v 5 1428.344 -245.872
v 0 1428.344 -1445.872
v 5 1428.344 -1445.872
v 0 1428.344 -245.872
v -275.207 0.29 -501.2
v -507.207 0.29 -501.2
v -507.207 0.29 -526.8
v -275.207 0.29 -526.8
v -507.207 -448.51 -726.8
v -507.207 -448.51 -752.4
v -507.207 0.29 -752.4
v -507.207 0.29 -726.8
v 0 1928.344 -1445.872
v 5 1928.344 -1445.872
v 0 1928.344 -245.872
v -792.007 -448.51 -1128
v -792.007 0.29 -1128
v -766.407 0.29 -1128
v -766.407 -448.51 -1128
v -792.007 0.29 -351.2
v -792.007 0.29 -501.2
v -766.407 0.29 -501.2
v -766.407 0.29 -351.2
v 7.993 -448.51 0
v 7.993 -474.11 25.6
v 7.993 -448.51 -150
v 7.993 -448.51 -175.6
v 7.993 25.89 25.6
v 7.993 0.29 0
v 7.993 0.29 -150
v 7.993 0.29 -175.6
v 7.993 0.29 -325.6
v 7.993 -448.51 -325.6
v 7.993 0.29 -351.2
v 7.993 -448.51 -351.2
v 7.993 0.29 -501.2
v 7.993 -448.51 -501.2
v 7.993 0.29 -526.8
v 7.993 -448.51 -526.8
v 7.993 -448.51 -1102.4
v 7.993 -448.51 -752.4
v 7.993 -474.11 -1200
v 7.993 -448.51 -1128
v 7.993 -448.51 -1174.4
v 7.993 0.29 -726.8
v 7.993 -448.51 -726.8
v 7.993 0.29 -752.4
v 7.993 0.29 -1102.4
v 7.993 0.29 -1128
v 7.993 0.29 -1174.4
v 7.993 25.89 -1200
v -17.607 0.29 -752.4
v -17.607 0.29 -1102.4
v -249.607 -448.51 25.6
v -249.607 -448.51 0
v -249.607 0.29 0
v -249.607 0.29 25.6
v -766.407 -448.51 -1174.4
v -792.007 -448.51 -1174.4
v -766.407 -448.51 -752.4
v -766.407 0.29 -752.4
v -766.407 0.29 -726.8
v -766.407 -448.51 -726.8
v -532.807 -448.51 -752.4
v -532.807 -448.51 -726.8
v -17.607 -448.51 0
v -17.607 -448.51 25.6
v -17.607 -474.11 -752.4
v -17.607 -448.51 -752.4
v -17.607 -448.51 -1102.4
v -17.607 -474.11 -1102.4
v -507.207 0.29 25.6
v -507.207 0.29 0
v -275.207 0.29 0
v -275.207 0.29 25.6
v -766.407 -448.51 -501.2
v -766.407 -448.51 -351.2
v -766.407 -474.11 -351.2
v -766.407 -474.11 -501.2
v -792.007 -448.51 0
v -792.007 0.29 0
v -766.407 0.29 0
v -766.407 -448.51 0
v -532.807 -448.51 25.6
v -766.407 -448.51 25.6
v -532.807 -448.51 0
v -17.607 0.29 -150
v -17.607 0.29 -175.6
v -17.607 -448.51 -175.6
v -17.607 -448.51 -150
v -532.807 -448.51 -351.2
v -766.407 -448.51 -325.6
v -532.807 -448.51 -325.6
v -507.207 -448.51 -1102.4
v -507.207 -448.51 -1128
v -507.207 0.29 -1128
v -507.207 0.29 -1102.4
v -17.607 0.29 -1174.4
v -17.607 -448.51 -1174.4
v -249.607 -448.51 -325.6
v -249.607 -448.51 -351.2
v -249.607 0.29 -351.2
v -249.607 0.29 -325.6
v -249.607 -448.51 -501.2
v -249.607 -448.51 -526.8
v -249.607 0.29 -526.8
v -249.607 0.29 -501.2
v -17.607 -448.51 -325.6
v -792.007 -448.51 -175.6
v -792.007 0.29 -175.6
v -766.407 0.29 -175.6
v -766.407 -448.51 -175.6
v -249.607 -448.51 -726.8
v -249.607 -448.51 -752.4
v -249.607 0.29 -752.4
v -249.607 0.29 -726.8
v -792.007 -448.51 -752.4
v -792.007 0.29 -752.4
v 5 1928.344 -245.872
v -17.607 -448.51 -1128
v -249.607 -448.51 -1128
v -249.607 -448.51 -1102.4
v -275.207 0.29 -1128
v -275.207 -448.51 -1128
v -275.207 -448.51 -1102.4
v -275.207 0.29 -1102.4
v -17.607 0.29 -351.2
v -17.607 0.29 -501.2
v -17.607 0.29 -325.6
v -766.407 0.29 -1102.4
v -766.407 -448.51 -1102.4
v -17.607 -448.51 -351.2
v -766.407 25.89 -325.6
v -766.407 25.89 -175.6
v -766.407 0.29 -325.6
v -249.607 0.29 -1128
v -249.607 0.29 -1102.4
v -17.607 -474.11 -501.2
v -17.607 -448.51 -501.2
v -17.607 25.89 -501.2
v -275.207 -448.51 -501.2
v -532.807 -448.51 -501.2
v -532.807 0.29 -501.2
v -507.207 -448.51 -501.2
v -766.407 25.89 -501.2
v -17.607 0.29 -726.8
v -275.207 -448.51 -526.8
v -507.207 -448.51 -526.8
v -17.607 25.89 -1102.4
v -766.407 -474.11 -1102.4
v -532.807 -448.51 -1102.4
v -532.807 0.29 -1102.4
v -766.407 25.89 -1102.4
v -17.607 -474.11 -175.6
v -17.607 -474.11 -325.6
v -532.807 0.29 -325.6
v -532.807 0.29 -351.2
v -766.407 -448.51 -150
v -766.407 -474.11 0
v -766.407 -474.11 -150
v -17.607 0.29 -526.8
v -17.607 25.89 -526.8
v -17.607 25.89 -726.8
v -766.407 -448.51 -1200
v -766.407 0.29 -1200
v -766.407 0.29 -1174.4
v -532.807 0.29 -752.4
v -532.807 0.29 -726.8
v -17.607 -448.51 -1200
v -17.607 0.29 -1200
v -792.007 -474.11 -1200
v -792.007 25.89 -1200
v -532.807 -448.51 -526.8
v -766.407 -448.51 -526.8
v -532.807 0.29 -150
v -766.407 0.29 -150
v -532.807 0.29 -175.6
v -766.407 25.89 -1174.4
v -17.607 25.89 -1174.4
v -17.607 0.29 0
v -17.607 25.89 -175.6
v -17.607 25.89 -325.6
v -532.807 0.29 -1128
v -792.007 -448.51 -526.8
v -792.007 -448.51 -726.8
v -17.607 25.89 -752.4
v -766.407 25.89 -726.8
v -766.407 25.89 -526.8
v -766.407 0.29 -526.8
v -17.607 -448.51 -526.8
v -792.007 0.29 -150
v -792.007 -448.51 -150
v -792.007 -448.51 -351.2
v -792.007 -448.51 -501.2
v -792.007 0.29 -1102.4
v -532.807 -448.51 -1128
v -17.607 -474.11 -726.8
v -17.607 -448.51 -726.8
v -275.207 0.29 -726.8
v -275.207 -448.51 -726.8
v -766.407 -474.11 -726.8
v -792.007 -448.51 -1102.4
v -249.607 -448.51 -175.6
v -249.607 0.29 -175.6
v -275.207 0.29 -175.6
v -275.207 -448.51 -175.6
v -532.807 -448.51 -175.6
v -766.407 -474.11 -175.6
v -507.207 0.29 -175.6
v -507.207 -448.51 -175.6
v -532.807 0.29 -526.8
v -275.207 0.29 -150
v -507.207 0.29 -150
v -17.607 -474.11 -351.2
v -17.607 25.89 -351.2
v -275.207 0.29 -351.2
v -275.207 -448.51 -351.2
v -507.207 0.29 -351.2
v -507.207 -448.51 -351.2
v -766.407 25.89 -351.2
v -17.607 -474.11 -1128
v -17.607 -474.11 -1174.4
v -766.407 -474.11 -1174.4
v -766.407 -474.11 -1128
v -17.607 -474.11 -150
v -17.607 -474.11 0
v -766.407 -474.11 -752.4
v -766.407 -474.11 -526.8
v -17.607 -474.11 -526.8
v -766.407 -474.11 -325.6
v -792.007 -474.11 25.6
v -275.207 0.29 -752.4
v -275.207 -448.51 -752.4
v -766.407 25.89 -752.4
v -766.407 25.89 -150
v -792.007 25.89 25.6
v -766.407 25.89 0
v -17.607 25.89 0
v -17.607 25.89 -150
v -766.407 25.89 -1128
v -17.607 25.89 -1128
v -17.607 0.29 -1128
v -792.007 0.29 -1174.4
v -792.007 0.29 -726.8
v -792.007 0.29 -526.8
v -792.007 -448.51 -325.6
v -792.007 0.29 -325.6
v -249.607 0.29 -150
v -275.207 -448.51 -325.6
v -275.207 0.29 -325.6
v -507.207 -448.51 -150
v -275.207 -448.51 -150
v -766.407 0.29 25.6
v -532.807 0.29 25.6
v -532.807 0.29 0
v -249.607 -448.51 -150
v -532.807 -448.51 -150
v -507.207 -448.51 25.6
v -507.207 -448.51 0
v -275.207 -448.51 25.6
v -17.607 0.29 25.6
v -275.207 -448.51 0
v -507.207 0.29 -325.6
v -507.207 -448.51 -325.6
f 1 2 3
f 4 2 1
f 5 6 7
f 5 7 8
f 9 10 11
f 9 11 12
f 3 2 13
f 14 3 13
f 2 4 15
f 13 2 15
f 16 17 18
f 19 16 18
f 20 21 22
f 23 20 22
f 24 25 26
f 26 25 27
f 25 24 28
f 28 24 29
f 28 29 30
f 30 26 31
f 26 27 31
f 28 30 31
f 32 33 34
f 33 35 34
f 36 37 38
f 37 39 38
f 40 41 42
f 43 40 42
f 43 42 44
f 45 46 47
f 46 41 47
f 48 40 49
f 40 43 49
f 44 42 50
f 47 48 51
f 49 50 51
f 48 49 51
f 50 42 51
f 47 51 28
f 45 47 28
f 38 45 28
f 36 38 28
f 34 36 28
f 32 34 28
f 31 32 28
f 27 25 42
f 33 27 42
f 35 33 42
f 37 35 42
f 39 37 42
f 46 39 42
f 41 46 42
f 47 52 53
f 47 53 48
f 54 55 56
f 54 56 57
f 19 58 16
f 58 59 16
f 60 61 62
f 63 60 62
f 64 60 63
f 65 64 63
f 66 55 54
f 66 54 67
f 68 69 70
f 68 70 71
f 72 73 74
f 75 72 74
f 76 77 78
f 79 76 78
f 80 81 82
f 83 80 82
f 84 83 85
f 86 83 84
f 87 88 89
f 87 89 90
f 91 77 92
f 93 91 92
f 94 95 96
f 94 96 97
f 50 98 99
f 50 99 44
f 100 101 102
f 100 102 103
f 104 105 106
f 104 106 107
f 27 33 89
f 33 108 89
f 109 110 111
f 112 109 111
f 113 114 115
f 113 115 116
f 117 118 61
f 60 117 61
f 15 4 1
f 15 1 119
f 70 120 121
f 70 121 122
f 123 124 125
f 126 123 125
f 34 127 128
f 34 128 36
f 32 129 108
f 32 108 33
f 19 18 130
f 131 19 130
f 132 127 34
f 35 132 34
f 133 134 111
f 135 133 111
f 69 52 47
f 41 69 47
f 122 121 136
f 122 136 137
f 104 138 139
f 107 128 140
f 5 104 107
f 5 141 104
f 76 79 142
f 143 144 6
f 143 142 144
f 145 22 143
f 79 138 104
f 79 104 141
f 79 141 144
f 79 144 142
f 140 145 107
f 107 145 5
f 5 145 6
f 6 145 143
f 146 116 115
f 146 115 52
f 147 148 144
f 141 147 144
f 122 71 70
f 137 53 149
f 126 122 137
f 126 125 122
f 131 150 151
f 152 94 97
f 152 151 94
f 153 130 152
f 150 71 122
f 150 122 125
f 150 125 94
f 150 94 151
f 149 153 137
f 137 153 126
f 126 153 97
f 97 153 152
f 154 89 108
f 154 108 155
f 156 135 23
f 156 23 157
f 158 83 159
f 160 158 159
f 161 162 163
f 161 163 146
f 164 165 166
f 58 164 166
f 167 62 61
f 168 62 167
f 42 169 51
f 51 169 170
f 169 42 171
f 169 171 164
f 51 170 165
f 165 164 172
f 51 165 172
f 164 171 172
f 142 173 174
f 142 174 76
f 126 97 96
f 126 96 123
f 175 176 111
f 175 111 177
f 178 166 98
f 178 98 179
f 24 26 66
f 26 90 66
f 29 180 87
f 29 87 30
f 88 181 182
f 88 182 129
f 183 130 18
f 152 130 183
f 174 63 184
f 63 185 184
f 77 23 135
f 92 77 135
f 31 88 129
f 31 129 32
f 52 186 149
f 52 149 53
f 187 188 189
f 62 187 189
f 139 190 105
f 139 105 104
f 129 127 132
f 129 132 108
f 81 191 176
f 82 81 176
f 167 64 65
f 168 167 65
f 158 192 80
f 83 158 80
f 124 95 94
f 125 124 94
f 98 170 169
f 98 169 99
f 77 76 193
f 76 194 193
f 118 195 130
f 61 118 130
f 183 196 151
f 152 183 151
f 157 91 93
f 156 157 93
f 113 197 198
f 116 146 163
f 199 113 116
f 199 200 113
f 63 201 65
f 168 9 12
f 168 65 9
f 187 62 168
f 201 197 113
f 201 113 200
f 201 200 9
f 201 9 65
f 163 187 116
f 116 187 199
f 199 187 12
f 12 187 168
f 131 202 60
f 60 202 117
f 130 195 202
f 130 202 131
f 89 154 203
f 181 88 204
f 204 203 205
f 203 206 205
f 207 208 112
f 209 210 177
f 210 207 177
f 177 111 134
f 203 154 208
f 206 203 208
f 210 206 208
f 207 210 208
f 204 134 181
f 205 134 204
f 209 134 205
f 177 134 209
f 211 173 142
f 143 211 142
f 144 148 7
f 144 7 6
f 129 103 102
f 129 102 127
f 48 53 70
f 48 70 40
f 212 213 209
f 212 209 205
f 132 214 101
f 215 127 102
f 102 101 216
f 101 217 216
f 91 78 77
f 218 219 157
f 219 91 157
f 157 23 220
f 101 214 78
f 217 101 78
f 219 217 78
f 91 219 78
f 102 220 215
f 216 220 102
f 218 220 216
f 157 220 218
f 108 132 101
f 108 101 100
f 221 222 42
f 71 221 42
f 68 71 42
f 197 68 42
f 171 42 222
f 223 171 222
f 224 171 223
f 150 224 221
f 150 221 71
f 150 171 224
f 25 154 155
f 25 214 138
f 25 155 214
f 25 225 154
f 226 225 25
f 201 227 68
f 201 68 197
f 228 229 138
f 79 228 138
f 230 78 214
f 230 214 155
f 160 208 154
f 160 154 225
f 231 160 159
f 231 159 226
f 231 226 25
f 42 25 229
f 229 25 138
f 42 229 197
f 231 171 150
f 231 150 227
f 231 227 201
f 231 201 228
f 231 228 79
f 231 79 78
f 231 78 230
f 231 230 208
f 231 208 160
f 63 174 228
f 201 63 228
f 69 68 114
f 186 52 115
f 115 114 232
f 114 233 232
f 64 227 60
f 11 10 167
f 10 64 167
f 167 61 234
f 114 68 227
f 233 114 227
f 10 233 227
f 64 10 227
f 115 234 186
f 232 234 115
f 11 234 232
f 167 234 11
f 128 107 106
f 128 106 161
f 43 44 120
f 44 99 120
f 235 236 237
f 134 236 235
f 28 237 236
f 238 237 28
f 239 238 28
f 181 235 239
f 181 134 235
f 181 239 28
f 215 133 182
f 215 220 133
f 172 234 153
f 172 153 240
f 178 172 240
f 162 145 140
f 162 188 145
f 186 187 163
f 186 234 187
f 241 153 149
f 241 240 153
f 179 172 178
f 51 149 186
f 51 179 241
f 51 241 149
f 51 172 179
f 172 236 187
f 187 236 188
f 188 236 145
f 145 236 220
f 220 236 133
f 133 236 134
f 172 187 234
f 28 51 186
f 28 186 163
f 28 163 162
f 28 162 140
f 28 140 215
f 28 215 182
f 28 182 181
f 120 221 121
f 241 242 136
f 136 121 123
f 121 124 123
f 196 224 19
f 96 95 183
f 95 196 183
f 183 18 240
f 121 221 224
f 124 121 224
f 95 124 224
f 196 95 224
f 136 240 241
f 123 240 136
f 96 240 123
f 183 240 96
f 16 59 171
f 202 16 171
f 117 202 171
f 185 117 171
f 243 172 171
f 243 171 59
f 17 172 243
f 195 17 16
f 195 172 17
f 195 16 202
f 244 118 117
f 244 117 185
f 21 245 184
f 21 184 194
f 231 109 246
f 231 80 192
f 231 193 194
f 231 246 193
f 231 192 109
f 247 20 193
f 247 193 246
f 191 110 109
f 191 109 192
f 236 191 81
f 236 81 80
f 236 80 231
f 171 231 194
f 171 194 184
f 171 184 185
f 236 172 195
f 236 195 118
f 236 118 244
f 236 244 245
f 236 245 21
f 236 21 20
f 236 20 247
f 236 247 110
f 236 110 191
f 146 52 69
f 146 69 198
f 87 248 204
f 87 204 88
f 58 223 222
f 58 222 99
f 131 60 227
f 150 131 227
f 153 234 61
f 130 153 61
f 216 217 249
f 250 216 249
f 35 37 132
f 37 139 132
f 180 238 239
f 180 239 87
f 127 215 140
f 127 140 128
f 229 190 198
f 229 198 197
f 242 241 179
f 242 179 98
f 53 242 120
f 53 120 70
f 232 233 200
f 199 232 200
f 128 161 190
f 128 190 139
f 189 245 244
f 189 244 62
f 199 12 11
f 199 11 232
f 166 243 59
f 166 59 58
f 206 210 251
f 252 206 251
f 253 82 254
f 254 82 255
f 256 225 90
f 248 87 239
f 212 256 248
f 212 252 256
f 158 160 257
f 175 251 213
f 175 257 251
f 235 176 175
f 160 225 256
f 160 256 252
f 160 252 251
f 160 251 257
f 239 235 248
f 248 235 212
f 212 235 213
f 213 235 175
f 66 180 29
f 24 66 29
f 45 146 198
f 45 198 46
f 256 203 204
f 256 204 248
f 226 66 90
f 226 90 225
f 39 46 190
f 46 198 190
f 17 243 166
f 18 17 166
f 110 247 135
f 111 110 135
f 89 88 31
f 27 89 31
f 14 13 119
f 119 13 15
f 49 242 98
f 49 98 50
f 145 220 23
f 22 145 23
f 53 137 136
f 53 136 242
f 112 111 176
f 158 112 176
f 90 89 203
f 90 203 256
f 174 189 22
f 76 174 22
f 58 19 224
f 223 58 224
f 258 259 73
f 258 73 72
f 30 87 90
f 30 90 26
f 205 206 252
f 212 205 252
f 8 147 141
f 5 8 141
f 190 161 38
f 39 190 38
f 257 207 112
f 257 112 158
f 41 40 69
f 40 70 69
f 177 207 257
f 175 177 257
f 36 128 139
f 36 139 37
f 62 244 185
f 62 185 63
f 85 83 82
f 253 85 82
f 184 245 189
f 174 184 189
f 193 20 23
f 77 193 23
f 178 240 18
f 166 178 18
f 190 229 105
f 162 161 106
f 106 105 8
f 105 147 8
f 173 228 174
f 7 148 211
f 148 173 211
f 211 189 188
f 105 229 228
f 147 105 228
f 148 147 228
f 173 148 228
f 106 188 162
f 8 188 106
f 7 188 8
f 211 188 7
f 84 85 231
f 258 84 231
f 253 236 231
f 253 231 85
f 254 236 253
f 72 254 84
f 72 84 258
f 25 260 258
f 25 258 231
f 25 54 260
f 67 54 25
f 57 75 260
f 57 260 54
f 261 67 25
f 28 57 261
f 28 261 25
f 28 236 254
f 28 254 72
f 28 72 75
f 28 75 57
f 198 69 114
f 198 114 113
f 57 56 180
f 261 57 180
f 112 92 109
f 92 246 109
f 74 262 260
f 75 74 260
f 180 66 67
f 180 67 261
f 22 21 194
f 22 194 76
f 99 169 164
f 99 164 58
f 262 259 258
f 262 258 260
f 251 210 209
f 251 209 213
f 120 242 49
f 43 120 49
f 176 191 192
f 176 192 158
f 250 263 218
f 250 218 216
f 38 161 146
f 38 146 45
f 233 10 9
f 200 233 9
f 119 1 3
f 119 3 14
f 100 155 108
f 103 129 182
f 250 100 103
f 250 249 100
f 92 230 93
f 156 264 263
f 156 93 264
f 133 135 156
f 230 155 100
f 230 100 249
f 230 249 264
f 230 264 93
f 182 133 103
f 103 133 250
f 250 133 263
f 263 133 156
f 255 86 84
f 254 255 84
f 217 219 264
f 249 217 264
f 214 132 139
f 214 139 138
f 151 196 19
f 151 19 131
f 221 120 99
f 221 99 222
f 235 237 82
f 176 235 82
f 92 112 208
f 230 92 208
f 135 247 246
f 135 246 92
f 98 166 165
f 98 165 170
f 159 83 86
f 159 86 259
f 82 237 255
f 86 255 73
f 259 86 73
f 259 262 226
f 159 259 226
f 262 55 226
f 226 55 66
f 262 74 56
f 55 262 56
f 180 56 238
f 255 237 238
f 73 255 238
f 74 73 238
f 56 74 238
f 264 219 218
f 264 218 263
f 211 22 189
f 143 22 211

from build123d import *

# Parameters (mm, degrees)
F0_W      = 800
F0_H      = 500
F0_W_2    = 748.8
F0_H_2    = 448.8
F1_DEPTH  = 25.6
F2_W      = 25.6
F2_H      = 25.6
F3_DEPTH  = 1200
F4_W      = 25.6
F4_H      = 25.6
F5_DEPTH  = 748.8
F6_W      = 25.6
F6_H      = 25.6
F7_DEPTH  = 448.8
F8_W      = 25.6
F8_H      = 25.6
F9_DEPTH  = 448.8
F10_W     = 500
F10_H     = 1200
F11_DEPTH = 5


with BuildPart() as f1:
    # F0 (on Top) → F1 (new body)
    with BuildSketch(Plane.XY):
        with Locations((-392.007131, -224.110312)):
            Rectangle(F0_W, F0_H)
        with Locations((-392.007131, -224.110312)):
            Rectangle(F0_W_2, F0_H_2, mode=Mode.SUBTRACT)
    extrude(amount=F1_DEPTH)

    # F2 (on face) → F3 (join)
    with BuildSketch(Plane(origin=(0, 0, 0), x_dir=(1, 0, 0), z_dir=(0, 0, -1))):
        with Locations((-779.207131, 461.310312)):
            Rectangle(F2_W, F2_H)
        with Locations((-4.807131, 461.310312)):
            Rectangle(F2_W, F2_H)
        with Locations((-4.807131, -13.089688)):
            Rectangle(F2_W, F2_H)
        with Locations((-779.207131, -13.089688)):
            Rectangle(F2_W, F2_H)
    extrude(amount=F3_DEPTH)

    # F4 (on face) → F5 (join, through all)
    with BuildSketch(Plane.YZ.offset(-766.407131)):
        with Locations((-461.310312, -162.8)):
            Rectangle(F4_W, F4_H)
        with Locations((-461.310312, -338.4)):
            Rectangle(F4_W, F4_H)
        with Locations((-461.310312, -514)):
            Rectangle(F4_W, F4_H)
        with Locations((-461.310312, -739.6)):
            Rectangle(F4_W, F4_H)
        with Locations((-461.310312, -1187.2)):
            Rectangle(F4_W, F4_H)
        with Locations((-461.310312, -1115.2)):
            Rectangle(F4_W, F4_H)
        with Locations((13.089688, -162.8)):
            Rectangle(F4_W, F4_H)
        with Locations((13.089688, -338.4)):
            Rectangle(F4_W, F4_H)
        with Locations((13.089688, -514)):
            Rectangle(F4_W, F4_H)
        with Locations((13.089688, -739.6)):
            Rectangle(F4_W, F4_H)
        with Locations((13.089688, -1187.2)):
            Rectangle(F4_W, F4_H)
        with Locations((13.089688, -1115.2)):
            Rectangle(F4_W, F4_H)
    extrude(amount=F5_DEPTH)

    # F6 (on face) → F7 (join, through all)
    with BuildSketch(Plane.XZ.offset(-0.289688)):
        with Locations((-779.207131, -162.8)):
            Rectangle(F6_W, F6_H)
        with Locations((-779.207131, -338.4)):
            Rectangle(F6_W, F6_H)
        with Locations((-779.207131, -514)):
            Rectangle(F6_W, F6_H)
        with Locations((-779.207131, -739.6)):
            Rectangle(F6_W, F6_H)
        with Locations((-779.207131, -1187.2)):
            Rectangle(F6_W, F6_H)
        with Locations((-779.207131, -1115.2)):
            Rectangle(F6_W, F6_H)
        with Locations((-4.807131, -162.8)):
            Rectangle(F6_W, F6_H)
        with Locations((-4.807131, -338.4)):
            Rectangle(F6_W, F6_H)
        with Locations((-4.807131, -514)):
            Rectangle(F6_W, F6_H)
        with Locations((-4.807131, -739.6)):
            Rectangle(F6_W, F6_H)
        with Locations((-4.807131, -1187.2)):
            Rectangle(F6_W, F6_H)
        with Locations((-4.807131, -1115.2)):
            Rectangle(F6_W, F6_H)
    extrude(amount=F7_DEPTH)

    # F8 (on face) → F9 (join, through all)
    with BuildSketch(Plane(origin=(0, -448.510312, 0), x_dir=(-1, 0, 0), z_dir=(0, 1, 0))):
        with Locations((262.407131, 12.8)):
            Rectangle(F8_W, F8_H)
        with Locations((520.007131, 12.8)):
            Rectangle(F8_W, F8_H)
        with Locations((262.407131, -162.8)):
            Rectangle(F8_W, F8_H)
        with Locations((520.007131, -162.8)):
            Rectangle(F8_W, F8_H)
        with Locations((262.407131, -338.4)):
            Rectangle(F8_W, F8_H)
        with Locations((520.007131, -338.4)):
            Rectangle(F8_W, F8_H)
        with Locations((262.407131, -514)):
            Rectangle(F8_W, F8_H)
        with Locations((520.007131, -514)):
            Rectangle(F8_W, F8_H)
        with Locations((262.407131, -739.6)):
            Rectangle(F8_W, F8_H)
        with Locations((520.007131, -739.6)):
            Rectangle(F8_W, F8_H)
        with Locations((262.407131, -1115.2)):
            Rectangle(F8_W, F8_H)
        with Locations((520.007131, -1115.2)):
            Rectangle(F8_W, F8_H)
    extrude(amount=F9_DEPTH)


with BuildPart() as f11:
    # F10 (on Right) → F11 (new body)
    with BuildSketch(Plane.YZ):
        with Locations((1678.344158, -845.871907)):
            Rectangle(F10_W, F10_H)
    extrude(amount=F11_DEPTH)


solid = Compound([f1.part, f11.part])
